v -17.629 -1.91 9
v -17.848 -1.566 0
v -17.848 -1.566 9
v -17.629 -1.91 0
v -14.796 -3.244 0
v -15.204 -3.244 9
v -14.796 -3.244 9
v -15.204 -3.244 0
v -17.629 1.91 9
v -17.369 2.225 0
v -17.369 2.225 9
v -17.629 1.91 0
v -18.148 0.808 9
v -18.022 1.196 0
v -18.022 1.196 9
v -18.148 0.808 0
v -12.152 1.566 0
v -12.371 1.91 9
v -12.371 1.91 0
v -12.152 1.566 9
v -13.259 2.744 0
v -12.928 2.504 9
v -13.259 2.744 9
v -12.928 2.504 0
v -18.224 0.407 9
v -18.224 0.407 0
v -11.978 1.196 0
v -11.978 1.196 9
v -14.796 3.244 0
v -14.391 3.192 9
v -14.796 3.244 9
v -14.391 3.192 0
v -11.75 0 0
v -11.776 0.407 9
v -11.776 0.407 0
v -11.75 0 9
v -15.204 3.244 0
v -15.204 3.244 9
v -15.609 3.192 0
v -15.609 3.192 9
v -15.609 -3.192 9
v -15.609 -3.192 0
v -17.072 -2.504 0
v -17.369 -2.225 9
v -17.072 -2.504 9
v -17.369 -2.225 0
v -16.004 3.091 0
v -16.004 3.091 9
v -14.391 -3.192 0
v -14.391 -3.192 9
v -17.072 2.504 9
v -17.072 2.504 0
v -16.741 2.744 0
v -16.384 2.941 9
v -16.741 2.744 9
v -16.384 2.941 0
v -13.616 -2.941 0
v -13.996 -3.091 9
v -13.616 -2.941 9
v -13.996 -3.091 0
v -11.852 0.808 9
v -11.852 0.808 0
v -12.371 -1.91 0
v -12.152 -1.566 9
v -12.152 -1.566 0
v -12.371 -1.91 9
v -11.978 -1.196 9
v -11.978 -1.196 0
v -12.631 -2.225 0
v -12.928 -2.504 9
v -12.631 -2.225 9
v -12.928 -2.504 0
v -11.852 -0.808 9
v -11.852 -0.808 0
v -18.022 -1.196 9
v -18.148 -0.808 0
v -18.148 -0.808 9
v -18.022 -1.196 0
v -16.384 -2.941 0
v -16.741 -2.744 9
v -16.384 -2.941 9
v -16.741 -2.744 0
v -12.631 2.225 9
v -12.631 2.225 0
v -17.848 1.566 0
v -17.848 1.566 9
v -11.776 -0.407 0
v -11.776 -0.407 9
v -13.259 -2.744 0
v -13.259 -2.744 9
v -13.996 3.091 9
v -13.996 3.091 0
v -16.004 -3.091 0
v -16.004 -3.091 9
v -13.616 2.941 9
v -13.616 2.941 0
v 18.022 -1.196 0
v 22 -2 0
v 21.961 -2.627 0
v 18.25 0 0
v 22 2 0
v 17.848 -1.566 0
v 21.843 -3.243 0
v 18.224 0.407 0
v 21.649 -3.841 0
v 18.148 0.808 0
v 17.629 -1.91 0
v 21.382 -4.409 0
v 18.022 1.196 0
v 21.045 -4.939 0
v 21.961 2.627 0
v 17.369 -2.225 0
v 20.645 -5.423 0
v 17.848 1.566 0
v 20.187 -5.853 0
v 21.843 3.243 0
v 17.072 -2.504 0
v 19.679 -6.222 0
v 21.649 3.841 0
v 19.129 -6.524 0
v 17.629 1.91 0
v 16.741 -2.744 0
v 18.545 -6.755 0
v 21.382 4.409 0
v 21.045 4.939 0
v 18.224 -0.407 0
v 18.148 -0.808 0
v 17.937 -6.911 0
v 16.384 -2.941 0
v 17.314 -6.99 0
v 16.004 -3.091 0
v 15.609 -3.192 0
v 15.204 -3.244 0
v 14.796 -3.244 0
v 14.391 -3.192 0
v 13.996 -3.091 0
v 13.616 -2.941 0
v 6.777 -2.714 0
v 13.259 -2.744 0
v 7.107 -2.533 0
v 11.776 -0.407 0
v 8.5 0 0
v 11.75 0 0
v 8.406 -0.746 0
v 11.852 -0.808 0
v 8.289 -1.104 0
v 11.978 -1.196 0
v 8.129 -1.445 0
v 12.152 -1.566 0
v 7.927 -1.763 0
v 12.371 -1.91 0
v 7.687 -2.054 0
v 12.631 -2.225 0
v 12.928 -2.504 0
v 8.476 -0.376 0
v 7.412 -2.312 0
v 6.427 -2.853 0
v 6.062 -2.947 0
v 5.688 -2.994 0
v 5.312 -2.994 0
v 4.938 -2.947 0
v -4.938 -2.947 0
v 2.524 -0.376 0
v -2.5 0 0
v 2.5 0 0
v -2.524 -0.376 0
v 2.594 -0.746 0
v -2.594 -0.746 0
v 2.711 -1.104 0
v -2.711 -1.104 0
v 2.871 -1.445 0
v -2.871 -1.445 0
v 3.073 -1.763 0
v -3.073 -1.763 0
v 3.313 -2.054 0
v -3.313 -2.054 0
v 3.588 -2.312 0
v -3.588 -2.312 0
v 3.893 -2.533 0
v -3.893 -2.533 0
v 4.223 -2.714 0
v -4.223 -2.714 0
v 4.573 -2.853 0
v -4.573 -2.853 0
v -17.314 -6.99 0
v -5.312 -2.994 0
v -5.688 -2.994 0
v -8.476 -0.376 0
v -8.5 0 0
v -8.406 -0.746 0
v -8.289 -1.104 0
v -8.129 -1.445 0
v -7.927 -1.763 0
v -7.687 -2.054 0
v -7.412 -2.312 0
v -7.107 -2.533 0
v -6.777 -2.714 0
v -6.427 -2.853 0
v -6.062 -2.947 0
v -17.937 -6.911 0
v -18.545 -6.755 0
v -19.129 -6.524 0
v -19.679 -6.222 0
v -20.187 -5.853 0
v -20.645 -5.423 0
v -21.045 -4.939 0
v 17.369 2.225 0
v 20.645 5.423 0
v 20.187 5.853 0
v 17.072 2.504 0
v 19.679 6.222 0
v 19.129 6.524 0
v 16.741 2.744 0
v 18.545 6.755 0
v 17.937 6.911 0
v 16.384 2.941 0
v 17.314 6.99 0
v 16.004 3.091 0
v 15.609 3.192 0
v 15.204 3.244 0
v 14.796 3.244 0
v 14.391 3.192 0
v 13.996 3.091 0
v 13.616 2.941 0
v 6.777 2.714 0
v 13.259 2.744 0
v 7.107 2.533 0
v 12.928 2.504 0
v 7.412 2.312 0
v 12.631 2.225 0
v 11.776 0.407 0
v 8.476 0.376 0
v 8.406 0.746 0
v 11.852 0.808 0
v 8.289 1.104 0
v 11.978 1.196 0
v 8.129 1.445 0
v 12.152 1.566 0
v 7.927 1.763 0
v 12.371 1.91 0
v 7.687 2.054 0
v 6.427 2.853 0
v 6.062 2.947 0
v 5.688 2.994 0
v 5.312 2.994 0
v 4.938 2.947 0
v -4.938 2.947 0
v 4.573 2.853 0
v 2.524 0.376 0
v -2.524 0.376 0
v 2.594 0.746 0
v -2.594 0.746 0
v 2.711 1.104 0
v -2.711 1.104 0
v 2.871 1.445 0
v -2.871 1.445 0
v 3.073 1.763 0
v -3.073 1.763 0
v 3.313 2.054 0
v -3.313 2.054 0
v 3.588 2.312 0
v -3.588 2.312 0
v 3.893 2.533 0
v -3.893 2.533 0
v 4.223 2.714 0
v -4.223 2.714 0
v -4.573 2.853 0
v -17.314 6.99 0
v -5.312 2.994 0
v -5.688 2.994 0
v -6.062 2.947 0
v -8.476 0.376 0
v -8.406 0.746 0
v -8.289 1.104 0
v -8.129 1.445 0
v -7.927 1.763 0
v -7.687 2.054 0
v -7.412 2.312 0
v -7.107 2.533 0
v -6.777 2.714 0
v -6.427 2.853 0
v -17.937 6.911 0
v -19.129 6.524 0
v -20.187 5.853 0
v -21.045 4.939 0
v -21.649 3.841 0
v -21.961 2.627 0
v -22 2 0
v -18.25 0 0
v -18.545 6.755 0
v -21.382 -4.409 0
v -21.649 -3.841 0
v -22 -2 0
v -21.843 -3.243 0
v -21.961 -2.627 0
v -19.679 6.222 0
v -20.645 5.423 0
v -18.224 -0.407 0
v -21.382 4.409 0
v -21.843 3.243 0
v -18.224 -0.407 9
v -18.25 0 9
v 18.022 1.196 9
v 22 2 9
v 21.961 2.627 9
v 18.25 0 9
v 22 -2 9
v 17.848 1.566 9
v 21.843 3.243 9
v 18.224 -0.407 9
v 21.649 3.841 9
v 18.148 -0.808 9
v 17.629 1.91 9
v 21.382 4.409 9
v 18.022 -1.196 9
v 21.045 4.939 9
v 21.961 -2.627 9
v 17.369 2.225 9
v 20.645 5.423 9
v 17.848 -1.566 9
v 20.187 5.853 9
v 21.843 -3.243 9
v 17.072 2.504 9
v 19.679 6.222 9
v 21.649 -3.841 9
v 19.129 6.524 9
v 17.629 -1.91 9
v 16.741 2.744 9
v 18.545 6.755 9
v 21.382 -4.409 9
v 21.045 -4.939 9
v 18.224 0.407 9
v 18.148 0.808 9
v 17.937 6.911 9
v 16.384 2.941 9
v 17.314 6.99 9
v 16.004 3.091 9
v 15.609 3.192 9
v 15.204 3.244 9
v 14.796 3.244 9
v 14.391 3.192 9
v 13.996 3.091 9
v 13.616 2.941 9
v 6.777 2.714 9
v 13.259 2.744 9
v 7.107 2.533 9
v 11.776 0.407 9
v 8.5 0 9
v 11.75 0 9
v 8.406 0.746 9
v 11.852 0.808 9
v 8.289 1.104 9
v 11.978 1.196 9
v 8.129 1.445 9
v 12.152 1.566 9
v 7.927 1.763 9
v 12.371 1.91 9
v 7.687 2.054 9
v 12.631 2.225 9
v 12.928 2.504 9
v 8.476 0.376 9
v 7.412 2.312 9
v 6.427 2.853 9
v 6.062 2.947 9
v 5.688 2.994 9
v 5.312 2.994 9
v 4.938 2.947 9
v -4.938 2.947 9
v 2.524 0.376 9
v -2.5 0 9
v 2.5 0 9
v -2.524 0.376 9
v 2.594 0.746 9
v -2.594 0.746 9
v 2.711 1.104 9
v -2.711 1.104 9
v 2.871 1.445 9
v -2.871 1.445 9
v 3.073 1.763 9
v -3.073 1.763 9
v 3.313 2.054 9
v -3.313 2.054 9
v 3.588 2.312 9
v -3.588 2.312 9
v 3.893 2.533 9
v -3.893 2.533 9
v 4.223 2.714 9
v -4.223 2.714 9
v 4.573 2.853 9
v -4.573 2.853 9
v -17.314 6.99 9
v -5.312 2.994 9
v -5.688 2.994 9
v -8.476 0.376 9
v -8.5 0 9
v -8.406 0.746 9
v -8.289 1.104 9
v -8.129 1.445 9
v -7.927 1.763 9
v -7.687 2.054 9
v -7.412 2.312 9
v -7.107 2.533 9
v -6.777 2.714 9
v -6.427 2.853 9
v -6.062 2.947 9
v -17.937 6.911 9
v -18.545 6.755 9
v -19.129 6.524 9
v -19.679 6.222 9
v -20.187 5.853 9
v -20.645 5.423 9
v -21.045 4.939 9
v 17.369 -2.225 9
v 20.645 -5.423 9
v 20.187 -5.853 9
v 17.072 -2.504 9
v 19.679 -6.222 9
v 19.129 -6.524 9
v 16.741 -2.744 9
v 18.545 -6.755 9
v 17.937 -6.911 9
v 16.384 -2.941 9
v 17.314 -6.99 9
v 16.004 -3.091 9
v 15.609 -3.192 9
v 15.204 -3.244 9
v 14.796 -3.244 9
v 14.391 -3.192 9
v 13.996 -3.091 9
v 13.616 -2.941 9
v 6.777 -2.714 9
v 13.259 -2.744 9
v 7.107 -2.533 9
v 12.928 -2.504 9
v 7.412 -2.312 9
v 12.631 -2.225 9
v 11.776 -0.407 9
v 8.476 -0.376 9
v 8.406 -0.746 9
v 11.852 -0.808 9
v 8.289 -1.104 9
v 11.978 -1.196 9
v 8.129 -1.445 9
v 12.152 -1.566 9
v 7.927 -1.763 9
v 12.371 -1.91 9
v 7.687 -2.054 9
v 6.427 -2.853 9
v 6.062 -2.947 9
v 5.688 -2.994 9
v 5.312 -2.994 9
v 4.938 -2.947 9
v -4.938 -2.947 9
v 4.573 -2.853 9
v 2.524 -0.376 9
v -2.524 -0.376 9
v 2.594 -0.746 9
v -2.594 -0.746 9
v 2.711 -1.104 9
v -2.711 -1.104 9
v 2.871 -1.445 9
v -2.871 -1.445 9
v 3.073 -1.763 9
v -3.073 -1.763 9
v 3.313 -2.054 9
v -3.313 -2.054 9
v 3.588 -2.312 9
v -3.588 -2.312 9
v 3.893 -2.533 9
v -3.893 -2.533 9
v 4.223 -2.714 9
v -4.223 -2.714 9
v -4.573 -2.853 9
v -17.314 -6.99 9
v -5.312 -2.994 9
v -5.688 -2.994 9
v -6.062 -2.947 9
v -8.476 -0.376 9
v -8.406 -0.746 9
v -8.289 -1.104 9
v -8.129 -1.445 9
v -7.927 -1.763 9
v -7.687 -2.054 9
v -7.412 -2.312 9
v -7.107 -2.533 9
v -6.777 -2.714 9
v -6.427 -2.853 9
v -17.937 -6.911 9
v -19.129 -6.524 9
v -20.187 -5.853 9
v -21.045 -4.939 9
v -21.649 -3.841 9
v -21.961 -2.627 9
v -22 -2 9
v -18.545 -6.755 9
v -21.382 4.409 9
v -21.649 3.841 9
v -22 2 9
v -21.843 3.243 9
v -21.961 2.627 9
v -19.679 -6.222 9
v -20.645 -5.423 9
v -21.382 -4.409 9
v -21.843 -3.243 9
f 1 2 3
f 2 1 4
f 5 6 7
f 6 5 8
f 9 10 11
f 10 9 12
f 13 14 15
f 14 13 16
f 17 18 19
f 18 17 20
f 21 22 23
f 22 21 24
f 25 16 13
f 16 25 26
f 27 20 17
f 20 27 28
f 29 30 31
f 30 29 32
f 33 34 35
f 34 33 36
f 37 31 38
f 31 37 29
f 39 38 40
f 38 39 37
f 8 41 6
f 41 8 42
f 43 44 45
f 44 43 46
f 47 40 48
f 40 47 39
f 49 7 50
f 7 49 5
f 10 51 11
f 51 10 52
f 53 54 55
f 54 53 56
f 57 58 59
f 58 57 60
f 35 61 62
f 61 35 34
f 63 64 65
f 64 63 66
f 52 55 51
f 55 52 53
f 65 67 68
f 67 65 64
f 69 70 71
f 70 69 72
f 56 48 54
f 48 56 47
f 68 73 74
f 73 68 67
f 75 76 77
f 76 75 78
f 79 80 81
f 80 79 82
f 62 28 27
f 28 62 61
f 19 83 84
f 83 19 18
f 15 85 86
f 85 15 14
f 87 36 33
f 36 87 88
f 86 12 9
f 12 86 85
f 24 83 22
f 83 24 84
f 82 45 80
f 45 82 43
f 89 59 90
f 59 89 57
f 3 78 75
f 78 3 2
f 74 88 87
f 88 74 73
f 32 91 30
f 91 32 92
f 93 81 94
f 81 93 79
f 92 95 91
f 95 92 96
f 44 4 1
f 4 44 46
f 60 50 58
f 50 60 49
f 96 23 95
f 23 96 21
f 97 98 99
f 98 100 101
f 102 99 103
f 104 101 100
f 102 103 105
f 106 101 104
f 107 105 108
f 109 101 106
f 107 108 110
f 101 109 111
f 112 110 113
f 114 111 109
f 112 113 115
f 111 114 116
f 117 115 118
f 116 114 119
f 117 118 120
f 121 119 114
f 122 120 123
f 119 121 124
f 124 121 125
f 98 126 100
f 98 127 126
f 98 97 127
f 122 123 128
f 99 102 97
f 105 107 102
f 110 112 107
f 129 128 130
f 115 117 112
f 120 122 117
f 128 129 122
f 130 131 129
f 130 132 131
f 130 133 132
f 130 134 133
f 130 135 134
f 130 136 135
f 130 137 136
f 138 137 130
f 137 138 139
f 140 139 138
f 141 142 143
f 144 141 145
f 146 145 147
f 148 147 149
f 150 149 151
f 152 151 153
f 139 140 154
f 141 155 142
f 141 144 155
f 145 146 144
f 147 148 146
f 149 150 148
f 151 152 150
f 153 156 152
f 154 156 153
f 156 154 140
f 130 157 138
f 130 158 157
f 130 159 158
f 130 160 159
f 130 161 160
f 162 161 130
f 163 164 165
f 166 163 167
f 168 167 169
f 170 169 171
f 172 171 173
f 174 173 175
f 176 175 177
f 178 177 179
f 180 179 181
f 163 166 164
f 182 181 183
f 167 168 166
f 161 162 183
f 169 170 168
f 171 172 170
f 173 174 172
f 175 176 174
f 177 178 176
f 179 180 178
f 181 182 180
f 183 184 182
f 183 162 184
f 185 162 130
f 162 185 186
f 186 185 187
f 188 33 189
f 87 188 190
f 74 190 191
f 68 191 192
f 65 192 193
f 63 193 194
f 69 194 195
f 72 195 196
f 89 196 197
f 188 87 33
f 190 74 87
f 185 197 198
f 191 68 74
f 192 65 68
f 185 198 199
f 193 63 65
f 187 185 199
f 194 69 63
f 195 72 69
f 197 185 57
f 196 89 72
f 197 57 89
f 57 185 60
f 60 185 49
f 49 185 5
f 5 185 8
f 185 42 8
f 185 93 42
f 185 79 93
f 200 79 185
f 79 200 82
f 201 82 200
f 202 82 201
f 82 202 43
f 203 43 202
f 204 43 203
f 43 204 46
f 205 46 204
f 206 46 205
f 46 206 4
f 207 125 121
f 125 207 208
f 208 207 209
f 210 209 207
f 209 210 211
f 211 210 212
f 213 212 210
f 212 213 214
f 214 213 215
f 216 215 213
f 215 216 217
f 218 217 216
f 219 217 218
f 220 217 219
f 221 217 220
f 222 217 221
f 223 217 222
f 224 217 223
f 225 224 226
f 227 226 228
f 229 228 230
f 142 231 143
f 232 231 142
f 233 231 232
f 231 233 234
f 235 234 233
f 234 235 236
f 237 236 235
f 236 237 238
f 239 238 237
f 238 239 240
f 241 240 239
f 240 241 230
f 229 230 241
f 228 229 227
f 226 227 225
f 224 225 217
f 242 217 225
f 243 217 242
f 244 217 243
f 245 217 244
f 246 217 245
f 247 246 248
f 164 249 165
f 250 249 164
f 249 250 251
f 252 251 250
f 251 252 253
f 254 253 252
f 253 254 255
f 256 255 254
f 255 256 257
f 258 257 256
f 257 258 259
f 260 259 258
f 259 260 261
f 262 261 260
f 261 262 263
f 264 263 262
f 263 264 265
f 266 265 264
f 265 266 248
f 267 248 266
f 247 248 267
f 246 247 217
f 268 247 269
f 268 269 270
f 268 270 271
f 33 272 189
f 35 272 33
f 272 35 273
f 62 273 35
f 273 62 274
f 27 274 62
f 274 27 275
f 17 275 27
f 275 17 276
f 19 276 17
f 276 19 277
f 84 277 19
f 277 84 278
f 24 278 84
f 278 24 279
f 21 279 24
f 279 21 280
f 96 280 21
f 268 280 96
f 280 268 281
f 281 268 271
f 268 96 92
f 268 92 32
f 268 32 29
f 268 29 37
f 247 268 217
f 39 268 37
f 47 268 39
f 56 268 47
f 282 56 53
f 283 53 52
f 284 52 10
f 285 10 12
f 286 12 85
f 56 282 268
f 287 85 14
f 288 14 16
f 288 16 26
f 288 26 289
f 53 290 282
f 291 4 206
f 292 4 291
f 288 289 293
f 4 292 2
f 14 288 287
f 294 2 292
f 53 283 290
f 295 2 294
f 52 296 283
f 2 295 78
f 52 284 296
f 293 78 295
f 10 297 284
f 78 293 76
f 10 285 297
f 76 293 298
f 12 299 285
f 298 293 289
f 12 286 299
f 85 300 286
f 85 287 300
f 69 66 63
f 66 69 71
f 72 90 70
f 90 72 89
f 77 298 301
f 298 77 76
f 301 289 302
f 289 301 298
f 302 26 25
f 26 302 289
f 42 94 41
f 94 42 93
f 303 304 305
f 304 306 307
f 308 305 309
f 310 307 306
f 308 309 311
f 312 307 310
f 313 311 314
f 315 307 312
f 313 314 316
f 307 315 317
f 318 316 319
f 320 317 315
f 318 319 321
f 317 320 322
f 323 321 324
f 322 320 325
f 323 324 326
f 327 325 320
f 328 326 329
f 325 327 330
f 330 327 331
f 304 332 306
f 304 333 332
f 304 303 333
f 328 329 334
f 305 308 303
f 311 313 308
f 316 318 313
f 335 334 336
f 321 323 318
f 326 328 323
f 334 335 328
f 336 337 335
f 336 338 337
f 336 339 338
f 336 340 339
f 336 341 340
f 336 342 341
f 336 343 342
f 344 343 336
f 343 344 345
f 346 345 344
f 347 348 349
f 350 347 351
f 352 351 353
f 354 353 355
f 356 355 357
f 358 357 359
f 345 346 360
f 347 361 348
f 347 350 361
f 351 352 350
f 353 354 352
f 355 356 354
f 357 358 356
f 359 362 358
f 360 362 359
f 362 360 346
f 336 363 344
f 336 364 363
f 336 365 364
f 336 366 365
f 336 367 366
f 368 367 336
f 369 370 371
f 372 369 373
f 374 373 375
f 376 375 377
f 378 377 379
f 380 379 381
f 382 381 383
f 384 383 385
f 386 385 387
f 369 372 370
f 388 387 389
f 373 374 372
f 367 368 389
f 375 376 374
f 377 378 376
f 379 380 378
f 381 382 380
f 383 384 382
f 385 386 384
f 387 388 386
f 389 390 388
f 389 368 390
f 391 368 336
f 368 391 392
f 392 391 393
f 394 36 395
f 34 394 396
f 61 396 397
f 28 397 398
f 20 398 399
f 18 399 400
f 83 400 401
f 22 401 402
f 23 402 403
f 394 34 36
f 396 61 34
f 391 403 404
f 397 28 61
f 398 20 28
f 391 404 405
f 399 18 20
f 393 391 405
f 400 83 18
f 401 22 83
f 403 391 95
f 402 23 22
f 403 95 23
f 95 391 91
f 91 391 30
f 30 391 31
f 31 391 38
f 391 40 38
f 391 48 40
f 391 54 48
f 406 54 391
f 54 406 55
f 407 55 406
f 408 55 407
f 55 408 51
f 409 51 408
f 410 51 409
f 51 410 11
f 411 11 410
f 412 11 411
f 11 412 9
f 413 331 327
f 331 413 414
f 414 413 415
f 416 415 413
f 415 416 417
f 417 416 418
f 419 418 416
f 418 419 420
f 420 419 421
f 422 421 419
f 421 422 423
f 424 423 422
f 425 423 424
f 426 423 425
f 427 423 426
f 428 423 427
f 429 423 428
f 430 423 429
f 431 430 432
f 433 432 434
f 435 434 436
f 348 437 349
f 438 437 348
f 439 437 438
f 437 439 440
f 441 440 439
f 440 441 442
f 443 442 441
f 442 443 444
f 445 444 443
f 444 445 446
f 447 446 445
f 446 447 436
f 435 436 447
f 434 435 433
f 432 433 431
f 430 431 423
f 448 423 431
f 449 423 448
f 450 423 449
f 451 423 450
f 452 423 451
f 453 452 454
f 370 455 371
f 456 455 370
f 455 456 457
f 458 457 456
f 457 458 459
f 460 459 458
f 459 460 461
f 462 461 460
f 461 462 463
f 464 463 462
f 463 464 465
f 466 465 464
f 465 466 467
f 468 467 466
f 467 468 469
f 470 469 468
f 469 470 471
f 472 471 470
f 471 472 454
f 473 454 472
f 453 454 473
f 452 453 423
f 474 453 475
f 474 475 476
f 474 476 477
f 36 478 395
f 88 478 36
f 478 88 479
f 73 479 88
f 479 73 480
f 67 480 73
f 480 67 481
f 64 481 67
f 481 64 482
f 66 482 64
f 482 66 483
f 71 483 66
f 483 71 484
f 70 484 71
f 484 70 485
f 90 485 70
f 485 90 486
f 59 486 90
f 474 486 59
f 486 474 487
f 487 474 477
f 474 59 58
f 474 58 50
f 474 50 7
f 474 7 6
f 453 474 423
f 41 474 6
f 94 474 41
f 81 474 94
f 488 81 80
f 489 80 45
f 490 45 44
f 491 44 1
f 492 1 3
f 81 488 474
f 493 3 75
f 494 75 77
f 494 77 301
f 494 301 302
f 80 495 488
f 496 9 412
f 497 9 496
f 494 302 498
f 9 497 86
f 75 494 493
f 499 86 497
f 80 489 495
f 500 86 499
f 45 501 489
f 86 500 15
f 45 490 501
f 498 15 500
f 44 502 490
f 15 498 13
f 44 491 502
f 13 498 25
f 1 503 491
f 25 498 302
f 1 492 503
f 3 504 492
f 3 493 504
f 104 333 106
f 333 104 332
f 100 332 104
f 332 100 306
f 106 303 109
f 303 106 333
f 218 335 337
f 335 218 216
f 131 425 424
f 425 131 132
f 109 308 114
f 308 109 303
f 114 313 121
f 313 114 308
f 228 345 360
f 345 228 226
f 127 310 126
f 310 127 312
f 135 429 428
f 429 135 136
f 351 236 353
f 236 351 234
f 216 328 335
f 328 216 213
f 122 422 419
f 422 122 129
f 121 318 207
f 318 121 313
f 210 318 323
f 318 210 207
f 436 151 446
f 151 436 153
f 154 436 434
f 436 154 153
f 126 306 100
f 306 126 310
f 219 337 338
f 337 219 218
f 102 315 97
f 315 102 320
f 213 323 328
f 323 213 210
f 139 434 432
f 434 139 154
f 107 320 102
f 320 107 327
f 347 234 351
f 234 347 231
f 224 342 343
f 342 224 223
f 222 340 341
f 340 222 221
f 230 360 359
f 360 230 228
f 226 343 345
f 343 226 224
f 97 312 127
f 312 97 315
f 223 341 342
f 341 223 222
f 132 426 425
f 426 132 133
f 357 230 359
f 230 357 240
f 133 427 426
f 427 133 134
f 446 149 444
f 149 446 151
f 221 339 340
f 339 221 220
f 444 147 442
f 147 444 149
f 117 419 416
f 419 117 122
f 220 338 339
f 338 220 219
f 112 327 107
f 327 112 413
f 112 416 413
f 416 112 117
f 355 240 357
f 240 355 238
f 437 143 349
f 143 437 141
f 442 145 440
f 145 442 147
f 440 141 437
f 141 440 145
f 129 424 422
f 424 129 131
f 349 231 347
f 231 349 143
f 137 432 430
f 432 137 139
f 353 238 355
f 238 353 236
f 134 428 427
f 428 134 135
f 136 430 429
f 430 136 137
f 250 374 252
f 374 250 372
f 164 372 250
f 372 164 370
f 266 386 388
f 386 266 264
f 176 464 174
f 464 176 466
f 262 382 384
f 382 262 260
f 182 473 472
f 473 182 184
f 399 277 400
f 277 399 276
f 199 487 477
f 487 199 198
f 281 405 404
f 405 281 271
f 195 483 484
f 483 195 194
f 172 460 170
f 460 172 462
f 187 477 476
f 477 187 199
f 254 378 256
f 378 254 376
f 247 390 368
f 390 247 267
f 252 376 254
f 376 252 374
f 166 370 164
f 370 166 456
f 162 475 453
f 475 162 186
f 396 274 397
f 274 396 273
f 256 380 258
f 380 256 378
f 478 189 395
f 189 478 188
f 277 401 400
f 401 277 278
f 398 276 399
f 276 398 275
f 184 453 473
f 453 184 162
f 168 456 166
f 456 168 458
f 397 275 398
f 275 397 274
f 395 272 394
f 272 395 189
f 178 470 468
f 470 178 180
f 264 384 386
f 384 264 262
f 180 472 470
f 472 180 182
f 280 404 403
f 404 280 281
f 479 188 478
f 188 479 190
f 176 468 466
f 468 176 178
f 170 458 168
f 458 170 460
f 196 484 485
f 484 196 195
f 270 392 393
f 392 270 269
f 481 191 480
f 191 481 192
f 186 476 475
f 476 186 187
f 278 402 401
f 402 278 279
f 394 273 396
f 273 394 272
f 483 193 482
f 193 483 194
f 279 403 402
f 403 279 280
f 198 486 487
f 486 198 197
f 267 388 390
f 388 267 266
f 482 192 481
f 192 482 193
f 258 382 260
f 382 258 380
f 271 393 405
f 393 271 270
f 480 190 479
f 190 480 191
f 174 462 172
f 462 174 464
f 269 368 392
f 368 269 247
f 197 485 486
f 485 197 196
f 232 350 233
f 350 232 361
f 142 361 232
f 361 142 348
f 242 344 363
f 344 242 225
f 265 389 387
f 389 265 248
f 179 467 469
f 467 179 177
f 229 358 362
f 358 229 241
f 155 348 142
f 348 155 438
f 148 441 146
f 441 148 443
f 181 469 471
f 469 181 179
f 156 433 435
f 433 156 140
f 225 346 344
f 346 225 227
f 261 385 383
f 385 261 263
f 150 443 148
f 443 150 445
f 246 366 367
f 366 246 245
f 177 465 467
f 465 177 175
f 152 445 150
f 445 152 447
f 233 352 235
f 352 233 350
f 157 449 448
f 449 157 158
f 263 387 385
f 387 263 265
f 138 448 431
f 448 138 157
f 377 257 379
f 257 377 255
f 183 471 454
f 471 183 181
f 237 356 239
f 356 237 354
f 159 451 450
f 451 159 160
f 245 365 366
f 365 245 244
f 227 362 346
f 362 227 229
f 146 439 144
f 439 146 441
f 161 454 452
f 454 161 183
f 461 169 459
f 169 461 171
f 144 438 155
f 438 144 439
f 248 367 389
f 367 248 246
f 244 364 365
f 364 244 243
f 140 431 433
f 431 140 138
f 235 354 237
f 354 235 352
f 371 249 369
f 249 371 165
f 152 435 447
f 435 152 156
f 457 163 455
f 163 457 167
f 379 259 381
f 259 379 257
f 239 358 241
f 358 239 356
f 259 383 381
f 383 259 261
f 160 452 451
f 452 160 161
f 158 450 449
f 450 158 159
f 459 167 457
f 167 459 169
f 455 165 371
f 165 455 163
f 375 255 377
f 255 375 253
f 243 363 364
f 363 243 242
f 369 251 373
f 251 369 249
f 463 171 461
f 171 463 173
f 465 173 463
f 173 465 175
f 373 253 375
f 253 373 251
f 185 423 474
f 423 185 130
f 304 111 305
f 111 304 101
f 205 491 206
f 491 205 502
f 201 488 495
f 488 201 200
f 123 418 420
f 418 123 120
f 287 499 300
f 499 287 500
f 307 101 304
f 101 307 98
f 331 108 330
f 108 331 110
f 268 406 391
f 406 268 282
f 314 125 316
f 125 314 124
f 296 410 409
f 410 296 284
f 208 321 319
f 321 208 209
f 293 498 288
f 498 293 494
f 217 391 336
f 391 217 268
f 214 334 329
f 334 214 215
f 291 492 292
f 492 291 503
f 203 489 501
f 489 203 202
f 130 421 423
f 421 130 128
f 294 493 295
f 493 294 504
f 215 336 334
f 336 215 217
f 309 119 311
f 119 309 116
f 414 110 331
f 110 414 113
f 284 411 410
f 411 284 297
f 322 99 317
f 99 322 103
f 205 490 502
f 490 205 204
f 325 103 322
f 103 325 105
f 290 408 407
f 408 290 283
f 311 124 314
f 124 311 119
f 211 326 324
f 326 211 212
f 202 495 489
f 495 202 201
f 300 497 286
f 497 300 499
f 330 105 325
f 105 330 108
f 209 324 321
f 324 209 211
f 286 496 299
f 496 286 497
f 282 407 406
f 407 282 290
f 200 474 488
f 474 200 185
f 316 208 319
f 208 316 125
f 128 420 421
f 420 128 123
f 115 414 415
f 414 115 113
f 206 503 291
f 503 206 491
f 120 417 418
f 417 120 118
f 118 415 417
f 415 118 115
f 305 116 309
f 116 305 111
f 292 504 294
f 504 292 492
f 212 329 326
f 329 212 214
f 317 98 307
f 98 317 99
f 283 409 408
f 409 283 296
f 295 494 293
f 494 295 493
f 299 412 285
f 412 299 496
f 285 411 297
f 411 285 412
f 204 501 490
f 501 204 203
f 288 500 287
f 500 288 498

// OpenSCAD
$fn = 50;

difference() {
	union() {
		hull() {
			translate(v = [-17.0, 2.0, 0]) {
				cylinder(h = 9, r = 5);
			}
			translate(v = [17.0, 2.0, 0]) {
				cylinder(h = 9, r = 5);
			}
			translate(v = [-17.0, -2.0, 0]) {
				cylinder(h = 9, r = 5);
			}
			translate(v = [17.0, -2.0, 0]) {
				cylinder(h = 9, r = 5);
			}
		}
	}
	union() {
		translate(v = [-15.0, 0.0, 0]) {
			cylinder(h = 9, r = 3.25);
		}
		translate(v = [15.0, 0.0, 0]) {
			cylinder(h = 9, r = 3.25);
		}
		translate(v = [-5.5, 0, 0.0]) {
			cylinder(h = 9, r = 3.0);
		}
		translate(v = [5.5, 0, 0.0]) {
			cylinder(h = 9, r = 3.0);
		}
	}
}
